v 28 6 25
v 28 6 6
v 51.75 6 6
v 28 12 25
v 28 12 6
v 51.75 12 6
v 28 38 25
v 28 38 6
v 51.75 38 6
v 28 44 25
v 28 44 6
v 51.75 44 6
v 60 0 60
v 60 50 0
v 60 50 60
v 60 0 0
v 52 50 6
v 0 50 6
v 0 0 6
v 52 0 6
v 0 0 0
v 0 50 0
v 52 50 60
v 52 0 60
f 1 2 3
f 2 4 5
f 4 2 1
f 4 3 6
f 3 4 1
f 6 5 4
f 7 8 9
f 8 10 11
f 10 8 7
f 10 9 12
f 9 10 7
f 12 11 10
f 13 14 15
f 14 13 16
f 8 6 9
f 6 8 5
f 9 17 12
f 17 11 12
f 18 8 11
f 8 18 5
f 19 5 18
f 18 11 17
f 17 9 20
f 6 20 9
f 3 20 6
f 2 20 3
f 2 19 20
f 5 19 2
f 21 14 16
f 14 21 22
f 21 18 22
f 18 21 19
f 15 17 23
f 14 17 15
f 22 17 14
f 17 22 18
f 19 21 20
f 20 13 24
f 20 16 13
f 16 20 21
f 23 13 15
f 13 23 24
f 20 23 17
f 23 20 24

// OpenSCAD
$fn = 32;

// ----------------------------------------------------------------------
// Rib bracket: 2-gusset L bracket
// ----------------------------------------------------------------------

// --- parameters (mm) ---
base_l = 60;              // foot length, X
base_w = 50;              // foot width, Y
base_t = 6;               // foot thickness
plate_t = 8;              // upright plate thickness
plate_h = 60;             // overall height
gus_l = 24;               // gusset leg along the foot
gus_h = 20;               // gusset height
gus_t = 6;                // gusset thickness
gus_edge = 6;             // gusset margin from the foot edge
n_gus = 2;                // gusset count

gus_pitch = (base_w - 2 * gus_edge - gus_t) / (n_gus - 1);  // gusset pitch

union() {
  cube([base_l, base_w, base_t]);
  translate([base_l - plate_t, 0, base_t - 1])
    cube([plate_t, base_w, plate_h - base_t + 1]);
  for (i = [0 : n_gus - 1])
    translate([base_l - plate_t - gus_l, gus_edge + i * gus_pitch, base_t - 1])
      rotate([-90, 0, 0])
        linear_extrude(height = gus_t)
          polygon(points = [[0, 0], [gus_l + 1, 0], [0, -gus_h]]);
}
